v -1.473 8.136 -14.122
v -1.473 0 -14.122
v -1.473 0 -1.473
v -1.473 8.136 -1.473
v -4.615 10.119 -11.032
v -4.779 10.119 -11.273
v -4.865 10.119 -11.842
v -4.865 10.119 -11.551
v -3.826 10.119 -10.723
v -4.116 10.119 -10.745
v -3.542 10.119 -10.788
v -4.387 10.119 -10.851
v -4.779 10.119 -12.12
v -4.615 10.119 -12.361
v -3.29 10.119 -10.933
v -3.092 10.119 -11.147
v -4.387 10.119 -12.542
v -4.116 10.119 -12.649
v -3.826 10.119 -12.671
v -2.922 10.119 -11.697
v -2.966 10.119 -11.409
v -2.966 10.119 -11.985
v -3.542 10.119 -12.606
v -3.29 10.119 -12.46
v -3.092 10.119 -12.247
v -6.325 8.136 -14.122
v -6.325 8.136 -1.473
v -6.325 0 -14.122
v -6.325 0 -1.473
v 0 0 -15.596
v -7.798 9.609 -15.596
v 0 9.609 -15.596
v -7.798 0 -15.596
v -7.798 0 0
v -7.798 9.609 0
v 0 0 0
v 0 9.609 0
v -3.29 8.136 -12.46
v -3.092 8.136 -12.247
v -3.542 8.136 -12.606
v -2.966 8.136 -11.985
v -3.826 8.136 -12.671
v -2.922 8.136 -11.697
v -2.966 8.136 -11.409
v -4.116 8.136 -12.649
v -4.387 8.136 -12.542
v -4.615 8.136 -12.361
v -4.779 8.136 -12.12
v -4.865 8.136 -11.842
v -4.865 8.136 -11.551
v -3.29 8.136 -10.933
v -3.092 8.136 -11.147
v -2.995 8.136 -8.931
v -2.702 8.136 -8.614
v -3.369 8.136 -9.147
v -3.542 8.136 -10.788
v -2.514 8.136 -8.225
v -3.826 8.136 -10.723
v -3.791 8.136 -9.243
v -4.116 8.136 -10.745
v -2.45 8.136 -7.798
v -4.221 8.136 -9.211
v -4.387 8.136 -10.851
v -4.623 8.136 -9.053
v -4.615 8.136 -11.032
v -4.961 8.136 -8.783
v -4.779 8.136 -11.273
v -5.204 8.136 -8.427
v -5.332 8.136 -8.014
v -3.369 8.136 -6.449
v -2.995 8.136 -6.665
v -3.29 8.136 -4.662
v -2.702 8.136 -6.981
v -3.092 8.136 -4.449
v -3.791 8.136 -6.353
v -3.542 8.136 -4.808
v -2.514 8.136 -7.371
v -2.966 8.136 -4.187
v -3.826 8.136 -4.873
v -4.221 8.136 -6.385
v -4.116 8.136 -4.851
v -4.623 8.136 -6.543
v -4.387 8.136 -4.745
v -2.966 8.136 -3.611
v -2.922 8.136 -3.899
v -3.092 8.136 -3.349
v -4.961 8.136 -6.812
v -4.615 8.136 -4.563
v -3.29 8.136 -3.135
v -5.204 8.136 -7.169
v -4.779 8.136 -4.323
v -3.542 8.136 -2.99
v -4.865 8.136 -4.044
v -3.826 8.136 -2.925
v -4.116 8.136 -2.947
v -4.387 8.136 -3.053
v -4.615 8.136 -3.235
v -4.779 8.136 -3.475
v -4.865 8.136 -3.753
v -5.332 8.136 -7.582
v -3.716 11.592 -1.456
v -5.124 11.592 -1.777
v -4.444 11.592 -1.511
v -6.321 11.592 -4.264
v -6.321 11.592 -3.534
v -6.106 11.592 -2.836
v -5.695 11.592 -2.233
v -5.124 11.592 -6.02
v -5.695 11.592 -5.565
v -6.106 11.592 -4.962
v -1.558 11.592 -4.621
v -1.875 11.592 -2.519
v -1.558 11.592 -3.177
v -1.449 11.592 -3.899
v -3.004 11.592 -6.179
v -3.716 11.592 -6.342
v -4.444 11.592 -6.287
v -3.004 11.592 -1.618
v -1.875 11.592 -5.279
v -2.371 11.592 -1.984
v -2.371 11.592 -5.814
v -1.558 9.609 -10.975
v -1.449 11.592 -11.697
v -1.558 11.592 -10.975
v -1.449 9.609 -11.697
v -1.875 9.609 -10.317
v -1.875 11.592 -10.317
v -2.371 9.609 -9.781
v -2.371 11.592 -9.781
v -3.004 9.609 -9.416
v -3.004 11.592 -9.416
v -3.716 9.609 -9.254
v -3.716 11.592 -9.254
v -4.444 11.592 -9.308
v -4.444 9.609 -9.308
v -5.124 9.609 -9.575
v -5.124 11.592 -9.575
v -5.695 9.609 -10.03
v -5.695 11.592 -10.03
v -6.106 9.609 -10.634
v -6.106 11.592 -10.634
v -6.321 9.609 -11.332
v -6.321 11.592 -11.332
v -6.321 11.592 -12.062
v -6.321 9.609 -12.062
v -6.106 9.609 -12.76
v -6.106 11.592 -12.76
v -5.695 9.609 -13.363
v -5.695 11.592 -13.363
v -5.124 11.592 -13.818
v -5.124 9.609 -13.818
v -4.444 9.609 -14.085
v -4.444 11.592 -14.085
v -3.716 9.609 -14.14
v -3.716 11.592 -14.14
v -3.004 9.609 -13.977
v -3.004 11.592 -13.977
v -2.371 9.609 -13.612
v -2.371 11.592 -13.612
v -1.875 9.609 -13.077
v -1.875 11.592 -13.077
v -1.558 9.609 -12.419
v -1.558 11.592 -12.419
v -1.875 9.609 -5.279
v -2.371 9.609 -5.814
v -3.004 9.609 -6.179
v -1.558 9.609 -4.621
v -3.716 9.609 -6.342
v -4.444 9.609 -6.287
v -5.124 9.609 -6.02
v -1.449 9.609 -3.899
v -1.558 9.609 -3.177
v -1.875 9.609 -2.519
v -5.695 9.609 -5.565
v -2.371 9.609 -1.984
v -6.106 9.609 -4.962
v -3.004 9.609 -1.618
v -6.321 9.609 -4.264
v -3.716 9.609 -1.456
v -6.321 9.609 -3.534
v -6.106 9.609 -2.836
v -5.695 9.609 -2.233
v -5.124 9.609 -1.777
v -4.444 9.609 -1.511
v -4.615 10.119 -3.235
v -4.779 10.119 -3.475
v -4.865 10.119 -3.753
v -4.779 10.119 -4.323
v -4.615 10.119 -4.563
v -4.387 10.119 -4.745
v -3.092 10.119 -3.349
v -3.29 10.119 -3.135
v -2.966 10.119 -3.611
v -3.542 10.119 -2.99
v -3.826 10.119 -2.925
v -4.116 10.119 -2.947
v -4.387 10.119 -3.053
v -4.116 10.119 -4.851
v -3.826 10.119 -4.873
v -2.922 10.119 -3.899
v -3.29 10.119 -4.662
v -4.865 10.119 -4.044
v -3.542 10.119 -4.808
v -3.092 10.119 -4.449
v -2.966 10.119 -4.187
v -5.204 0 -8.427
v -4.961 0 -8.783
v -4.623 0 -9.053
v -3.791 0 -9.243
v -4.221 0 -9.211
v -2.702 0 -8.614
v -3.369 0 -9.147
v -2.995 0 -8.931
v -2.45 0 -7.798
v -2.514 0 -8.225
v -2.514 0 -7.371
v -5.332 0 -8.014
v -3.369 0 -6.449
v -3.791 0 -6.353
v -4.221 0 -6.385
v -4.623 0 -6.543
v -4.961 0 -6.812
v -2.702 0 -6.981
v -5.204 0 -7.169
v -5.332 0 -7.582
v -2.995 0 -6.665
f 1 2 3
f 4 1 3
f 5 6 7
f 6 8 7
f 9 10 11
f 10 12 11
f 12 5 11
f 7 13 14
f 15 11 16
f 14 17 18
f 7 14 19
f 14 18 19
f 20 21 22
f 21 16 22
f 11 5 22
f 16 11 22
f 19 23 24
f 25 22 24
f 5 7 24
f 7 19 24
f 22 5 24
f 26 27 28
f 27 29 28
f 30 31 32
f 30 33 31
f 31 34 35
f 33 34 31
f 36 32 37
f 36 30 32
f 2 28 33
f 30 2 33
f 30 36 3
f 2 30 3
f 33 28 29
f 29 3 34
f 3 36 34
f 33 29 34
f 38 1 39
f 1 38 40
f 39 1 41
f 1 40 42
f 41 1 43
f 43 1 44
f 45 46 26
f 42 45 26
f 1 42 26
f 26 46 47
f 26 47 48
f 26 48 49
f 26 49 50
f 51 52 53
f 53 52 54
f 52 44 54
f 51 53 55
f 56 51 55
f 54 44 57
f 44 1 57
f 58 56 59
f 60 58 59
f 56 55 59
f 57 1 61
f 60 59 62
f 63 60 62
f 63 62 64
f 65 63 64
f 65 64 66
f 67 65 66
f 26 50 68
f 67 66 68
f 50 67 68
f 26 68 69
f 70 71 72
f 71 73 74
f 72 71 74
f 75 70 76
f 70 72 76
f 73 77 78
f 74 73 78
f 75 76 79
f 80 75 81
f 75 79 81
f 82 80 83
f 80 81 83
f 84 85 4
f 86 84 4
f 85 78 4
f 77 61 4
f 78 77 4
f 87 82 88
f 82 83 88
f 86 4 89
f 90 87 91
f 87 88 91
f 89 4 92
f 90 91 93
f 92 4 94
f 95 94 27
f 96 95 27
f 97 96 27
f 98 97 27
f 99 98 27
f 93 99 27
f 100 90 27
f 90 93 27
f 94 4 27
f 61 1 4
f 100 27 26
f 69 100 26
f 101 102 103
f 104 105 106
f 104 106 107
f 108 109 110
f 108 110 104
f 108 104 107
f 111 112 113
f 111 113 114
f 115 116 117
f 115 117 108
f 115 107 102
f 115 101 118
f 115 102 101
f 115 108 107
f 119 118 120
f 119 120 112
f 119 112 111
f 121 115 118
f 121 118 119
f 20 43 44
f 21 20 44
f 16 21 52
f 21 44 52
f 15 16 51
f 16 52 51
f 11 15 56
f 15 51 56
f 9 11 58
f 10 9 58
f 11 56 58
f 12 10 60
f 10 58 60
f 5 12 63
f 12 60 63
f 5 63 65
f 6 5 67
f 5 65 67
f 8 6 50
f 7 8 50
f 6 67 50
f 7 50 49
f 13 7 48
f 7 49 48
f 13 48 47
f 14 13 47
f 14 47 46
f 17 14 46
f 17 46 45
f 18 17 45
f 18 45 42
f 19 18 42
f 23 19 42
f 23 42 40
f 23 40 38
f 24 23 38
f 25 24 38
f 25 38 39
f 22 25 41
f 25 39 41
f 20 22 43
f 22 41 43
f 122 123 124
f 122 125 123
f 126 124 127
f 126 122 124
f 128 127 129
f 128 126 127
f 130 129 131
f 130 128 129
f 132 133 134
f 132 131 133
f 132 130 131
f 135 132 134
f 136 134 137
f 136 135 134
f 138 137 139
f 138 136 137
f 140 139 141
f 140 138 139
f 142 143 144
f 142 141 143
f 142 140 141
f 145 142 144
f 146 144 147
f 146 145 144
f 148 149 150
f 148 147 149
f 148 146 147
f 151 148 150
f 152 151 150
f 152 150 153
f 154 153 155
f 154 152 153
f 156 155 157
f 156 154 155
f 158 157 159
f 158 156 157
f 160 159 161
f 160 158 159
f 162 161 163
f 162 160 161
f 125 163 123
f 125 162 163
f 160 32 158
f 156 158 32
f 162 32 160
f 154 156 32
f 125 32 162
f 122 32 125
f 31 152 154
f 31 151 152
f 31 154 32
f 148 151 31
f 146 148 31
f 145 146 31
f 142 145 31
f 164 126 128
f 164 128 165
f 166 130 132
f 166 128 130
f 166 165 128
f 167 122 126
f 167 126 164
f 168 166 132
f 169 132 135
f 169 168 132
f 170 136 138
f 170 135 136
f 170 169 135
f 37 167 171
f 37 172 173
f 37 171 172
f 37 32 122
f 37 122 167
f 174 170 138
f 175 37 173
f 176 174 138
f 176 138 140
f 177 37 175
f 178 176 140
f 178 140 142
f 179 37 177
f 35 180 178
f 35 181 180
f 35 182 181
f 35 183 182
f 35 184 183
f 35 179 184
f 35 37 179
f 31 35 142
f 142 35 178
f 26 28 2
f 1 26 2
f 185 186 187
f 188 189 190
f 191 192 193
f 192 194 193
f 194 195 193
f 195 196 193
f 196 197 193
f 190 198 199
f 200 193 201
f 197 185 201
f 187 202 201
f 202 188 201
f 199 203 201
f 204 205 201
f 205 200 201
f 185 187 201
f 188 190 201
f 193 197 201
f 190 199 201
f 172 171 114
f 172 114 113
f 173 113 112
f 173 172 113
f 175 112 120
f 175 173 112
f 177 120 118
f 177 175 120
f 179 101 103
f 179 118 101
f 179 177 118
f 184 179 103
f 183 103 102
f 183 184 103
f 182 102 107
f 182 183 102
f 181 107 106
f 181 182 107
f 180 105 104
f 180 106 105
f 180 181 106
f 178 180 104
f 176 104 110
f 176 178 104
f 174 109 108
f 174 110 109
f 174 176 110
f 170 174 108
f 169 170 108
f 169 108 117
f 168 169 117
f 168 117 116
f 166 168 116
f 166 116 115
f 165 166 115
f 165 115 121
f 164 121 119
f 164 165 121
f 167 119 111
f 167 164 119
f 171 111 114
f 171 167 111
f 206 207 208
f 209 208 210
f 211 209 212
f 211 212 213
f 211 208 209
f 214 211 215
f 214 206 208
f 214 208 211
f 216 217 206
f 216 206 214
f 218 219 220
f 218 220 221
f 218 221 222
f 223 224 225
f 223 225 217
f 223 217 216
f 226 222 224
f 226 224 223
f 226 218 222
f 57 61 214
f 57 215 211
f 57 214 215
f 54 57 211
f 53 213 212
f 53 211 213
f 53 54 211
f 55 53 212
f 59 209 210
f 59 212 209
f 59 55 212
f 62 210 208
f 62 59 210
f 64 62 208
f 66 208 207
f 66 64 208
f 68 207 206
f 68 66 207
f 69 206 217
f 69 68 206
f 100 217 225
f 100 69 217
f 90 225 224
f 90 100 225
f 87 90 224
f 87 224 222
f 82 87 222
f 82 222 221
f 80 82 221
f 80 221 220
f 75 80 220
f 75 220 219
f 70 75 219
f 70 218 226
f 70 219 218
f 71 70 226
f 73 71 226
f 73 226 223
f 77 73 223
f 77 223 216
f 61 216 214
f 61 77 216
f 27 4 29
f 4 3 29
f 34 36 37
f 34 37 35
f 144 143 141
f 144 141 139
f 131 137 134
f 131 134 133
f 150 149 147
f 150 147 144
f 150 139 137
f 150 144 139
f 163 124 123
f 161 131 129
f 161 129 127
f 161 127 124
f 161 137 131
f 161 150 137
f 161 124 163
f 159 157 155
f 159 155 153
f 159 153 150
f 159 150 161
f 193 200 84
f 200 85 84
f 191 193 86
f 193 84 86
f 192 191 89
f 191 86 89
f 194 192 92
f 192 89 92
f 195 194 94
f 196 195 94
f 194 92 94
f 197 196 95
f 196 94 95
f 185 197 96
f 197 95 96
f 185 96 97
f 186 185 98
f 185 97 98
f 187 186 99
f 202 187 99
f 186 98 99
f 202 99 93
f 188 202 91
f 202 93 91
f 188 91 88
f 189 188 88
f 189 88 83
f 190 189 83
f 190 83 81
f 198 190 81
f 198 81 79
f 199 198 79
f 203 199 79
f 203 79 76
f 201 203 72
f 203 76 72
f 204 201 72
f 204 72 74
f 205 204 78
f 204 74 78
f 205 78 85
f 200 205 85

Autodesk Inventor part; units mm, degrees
ref_plane "YZ Plane" through (0, 0, 0) normal (1, 0, 0) x (0, 1, 0)
ref_plane "XZ Plane" through (0, 0, 0) normal (0, 1, 0) x (-1, 0, 0)
ref_plane "XY Plane" through (0, 0, 0) normal (0, 0, 1) x (1, 0, 0)
sketch "Sketch1" plane through (0, 0, 0) normal (0, 1, 0) x (-1, 0, 0)
  line L0 (0, 0) -> (7.7978, 0)
  line L1 (7.7978, 0) -> (7.7978, -15.5956)
  line L2 (7.7978, -15.5956) -> (0, -15.5956)
  line L3 (0, -15.5956) -> (0, 0)
  dimension "d0" = 7.7978
  dimension "d8" = 15.5956
extrude "Extrusion1" add sketch "Sketch1" along normal blind 9.6088
sketch "Sketch2" plane through (0, 9.6088, 0) normal (0, 1, 0) x (1, 0, 0)
  line L0 (-7.7978, 0) -> (0, 0) construction
  line L1 (0, 0) -> (-3.8989, 0) construction
  line L2 (-3.8989, 0) -> (-3.8989, 3.8989) construction
  line L3 (-3.8989, 3.8989) -> (0, 3.8989) construction
  line L4 (0, 3.8989) -> (0, 0) construction
  circle A0 centre (-3.8989, 3.8989) radius 2.4498
  dimension "d11" = 3.8989
  dimension "d12" = 3.8989
  dimension "d13" = 4.8997
extrude "Extrusion2" add sketch "Sketch2" along normal blind 1.9837
pattern_linear "Rectangular Pattern1" count 2 spacing 7.7978 along (0, 0, -1) of "Extrusion2"
shell "Shell1" thickness 1.4732 removed faces 1 at (-2.5993, 0, -5.1985)
sketch "Sketch3" plane through (-6.3246, 8.1356, -1.4732) normal (0, -1, 0) x (1, 0, 0)
  circle A0 centre (2.4257, -2.4257) radius 2.4498 construction
  circle A1 centre (2.4257, -10.2235) radius 2.4498 construction
  line L0 (2.4257, -2.4257) -> (2.4257, -10.2235) construction
  circle A2 centre (2.4257, -6.3246) radius 1.4491
  point P0 (6.3246, 1.4732)
extrude "Extrusion3" add sketch "Sketch3" along normal up to surface (8.1356 mm away)
equation "\"d0\" = d1"
equation "\"d8\" = 2 * d1"
equation "\"d9\" = d3"
equation "\"d11\" = 0.5 * d1"
equation "\"d12\" = 0.5 * d1"
equation "\"d13\" = d4"
equation "\"d14\" = d5"
equation "\"d18\" = d1"
equation "\"d19\" = d6"
equation "\"d20\" = d5"
equation "\"d1\" = 7.7978"
equation "\"d2\" = 3.23596"
equation "\"d3\" = 9.60882"
equation "\"d4\" = 4.89966"
equation "\"d5\" = 1.98374"
equation "\"d6\" = 1.4732"
equation "\"d7\" = 1.23952"
properties part number "1x2 tall white pegged" material "ABS Plastic"
